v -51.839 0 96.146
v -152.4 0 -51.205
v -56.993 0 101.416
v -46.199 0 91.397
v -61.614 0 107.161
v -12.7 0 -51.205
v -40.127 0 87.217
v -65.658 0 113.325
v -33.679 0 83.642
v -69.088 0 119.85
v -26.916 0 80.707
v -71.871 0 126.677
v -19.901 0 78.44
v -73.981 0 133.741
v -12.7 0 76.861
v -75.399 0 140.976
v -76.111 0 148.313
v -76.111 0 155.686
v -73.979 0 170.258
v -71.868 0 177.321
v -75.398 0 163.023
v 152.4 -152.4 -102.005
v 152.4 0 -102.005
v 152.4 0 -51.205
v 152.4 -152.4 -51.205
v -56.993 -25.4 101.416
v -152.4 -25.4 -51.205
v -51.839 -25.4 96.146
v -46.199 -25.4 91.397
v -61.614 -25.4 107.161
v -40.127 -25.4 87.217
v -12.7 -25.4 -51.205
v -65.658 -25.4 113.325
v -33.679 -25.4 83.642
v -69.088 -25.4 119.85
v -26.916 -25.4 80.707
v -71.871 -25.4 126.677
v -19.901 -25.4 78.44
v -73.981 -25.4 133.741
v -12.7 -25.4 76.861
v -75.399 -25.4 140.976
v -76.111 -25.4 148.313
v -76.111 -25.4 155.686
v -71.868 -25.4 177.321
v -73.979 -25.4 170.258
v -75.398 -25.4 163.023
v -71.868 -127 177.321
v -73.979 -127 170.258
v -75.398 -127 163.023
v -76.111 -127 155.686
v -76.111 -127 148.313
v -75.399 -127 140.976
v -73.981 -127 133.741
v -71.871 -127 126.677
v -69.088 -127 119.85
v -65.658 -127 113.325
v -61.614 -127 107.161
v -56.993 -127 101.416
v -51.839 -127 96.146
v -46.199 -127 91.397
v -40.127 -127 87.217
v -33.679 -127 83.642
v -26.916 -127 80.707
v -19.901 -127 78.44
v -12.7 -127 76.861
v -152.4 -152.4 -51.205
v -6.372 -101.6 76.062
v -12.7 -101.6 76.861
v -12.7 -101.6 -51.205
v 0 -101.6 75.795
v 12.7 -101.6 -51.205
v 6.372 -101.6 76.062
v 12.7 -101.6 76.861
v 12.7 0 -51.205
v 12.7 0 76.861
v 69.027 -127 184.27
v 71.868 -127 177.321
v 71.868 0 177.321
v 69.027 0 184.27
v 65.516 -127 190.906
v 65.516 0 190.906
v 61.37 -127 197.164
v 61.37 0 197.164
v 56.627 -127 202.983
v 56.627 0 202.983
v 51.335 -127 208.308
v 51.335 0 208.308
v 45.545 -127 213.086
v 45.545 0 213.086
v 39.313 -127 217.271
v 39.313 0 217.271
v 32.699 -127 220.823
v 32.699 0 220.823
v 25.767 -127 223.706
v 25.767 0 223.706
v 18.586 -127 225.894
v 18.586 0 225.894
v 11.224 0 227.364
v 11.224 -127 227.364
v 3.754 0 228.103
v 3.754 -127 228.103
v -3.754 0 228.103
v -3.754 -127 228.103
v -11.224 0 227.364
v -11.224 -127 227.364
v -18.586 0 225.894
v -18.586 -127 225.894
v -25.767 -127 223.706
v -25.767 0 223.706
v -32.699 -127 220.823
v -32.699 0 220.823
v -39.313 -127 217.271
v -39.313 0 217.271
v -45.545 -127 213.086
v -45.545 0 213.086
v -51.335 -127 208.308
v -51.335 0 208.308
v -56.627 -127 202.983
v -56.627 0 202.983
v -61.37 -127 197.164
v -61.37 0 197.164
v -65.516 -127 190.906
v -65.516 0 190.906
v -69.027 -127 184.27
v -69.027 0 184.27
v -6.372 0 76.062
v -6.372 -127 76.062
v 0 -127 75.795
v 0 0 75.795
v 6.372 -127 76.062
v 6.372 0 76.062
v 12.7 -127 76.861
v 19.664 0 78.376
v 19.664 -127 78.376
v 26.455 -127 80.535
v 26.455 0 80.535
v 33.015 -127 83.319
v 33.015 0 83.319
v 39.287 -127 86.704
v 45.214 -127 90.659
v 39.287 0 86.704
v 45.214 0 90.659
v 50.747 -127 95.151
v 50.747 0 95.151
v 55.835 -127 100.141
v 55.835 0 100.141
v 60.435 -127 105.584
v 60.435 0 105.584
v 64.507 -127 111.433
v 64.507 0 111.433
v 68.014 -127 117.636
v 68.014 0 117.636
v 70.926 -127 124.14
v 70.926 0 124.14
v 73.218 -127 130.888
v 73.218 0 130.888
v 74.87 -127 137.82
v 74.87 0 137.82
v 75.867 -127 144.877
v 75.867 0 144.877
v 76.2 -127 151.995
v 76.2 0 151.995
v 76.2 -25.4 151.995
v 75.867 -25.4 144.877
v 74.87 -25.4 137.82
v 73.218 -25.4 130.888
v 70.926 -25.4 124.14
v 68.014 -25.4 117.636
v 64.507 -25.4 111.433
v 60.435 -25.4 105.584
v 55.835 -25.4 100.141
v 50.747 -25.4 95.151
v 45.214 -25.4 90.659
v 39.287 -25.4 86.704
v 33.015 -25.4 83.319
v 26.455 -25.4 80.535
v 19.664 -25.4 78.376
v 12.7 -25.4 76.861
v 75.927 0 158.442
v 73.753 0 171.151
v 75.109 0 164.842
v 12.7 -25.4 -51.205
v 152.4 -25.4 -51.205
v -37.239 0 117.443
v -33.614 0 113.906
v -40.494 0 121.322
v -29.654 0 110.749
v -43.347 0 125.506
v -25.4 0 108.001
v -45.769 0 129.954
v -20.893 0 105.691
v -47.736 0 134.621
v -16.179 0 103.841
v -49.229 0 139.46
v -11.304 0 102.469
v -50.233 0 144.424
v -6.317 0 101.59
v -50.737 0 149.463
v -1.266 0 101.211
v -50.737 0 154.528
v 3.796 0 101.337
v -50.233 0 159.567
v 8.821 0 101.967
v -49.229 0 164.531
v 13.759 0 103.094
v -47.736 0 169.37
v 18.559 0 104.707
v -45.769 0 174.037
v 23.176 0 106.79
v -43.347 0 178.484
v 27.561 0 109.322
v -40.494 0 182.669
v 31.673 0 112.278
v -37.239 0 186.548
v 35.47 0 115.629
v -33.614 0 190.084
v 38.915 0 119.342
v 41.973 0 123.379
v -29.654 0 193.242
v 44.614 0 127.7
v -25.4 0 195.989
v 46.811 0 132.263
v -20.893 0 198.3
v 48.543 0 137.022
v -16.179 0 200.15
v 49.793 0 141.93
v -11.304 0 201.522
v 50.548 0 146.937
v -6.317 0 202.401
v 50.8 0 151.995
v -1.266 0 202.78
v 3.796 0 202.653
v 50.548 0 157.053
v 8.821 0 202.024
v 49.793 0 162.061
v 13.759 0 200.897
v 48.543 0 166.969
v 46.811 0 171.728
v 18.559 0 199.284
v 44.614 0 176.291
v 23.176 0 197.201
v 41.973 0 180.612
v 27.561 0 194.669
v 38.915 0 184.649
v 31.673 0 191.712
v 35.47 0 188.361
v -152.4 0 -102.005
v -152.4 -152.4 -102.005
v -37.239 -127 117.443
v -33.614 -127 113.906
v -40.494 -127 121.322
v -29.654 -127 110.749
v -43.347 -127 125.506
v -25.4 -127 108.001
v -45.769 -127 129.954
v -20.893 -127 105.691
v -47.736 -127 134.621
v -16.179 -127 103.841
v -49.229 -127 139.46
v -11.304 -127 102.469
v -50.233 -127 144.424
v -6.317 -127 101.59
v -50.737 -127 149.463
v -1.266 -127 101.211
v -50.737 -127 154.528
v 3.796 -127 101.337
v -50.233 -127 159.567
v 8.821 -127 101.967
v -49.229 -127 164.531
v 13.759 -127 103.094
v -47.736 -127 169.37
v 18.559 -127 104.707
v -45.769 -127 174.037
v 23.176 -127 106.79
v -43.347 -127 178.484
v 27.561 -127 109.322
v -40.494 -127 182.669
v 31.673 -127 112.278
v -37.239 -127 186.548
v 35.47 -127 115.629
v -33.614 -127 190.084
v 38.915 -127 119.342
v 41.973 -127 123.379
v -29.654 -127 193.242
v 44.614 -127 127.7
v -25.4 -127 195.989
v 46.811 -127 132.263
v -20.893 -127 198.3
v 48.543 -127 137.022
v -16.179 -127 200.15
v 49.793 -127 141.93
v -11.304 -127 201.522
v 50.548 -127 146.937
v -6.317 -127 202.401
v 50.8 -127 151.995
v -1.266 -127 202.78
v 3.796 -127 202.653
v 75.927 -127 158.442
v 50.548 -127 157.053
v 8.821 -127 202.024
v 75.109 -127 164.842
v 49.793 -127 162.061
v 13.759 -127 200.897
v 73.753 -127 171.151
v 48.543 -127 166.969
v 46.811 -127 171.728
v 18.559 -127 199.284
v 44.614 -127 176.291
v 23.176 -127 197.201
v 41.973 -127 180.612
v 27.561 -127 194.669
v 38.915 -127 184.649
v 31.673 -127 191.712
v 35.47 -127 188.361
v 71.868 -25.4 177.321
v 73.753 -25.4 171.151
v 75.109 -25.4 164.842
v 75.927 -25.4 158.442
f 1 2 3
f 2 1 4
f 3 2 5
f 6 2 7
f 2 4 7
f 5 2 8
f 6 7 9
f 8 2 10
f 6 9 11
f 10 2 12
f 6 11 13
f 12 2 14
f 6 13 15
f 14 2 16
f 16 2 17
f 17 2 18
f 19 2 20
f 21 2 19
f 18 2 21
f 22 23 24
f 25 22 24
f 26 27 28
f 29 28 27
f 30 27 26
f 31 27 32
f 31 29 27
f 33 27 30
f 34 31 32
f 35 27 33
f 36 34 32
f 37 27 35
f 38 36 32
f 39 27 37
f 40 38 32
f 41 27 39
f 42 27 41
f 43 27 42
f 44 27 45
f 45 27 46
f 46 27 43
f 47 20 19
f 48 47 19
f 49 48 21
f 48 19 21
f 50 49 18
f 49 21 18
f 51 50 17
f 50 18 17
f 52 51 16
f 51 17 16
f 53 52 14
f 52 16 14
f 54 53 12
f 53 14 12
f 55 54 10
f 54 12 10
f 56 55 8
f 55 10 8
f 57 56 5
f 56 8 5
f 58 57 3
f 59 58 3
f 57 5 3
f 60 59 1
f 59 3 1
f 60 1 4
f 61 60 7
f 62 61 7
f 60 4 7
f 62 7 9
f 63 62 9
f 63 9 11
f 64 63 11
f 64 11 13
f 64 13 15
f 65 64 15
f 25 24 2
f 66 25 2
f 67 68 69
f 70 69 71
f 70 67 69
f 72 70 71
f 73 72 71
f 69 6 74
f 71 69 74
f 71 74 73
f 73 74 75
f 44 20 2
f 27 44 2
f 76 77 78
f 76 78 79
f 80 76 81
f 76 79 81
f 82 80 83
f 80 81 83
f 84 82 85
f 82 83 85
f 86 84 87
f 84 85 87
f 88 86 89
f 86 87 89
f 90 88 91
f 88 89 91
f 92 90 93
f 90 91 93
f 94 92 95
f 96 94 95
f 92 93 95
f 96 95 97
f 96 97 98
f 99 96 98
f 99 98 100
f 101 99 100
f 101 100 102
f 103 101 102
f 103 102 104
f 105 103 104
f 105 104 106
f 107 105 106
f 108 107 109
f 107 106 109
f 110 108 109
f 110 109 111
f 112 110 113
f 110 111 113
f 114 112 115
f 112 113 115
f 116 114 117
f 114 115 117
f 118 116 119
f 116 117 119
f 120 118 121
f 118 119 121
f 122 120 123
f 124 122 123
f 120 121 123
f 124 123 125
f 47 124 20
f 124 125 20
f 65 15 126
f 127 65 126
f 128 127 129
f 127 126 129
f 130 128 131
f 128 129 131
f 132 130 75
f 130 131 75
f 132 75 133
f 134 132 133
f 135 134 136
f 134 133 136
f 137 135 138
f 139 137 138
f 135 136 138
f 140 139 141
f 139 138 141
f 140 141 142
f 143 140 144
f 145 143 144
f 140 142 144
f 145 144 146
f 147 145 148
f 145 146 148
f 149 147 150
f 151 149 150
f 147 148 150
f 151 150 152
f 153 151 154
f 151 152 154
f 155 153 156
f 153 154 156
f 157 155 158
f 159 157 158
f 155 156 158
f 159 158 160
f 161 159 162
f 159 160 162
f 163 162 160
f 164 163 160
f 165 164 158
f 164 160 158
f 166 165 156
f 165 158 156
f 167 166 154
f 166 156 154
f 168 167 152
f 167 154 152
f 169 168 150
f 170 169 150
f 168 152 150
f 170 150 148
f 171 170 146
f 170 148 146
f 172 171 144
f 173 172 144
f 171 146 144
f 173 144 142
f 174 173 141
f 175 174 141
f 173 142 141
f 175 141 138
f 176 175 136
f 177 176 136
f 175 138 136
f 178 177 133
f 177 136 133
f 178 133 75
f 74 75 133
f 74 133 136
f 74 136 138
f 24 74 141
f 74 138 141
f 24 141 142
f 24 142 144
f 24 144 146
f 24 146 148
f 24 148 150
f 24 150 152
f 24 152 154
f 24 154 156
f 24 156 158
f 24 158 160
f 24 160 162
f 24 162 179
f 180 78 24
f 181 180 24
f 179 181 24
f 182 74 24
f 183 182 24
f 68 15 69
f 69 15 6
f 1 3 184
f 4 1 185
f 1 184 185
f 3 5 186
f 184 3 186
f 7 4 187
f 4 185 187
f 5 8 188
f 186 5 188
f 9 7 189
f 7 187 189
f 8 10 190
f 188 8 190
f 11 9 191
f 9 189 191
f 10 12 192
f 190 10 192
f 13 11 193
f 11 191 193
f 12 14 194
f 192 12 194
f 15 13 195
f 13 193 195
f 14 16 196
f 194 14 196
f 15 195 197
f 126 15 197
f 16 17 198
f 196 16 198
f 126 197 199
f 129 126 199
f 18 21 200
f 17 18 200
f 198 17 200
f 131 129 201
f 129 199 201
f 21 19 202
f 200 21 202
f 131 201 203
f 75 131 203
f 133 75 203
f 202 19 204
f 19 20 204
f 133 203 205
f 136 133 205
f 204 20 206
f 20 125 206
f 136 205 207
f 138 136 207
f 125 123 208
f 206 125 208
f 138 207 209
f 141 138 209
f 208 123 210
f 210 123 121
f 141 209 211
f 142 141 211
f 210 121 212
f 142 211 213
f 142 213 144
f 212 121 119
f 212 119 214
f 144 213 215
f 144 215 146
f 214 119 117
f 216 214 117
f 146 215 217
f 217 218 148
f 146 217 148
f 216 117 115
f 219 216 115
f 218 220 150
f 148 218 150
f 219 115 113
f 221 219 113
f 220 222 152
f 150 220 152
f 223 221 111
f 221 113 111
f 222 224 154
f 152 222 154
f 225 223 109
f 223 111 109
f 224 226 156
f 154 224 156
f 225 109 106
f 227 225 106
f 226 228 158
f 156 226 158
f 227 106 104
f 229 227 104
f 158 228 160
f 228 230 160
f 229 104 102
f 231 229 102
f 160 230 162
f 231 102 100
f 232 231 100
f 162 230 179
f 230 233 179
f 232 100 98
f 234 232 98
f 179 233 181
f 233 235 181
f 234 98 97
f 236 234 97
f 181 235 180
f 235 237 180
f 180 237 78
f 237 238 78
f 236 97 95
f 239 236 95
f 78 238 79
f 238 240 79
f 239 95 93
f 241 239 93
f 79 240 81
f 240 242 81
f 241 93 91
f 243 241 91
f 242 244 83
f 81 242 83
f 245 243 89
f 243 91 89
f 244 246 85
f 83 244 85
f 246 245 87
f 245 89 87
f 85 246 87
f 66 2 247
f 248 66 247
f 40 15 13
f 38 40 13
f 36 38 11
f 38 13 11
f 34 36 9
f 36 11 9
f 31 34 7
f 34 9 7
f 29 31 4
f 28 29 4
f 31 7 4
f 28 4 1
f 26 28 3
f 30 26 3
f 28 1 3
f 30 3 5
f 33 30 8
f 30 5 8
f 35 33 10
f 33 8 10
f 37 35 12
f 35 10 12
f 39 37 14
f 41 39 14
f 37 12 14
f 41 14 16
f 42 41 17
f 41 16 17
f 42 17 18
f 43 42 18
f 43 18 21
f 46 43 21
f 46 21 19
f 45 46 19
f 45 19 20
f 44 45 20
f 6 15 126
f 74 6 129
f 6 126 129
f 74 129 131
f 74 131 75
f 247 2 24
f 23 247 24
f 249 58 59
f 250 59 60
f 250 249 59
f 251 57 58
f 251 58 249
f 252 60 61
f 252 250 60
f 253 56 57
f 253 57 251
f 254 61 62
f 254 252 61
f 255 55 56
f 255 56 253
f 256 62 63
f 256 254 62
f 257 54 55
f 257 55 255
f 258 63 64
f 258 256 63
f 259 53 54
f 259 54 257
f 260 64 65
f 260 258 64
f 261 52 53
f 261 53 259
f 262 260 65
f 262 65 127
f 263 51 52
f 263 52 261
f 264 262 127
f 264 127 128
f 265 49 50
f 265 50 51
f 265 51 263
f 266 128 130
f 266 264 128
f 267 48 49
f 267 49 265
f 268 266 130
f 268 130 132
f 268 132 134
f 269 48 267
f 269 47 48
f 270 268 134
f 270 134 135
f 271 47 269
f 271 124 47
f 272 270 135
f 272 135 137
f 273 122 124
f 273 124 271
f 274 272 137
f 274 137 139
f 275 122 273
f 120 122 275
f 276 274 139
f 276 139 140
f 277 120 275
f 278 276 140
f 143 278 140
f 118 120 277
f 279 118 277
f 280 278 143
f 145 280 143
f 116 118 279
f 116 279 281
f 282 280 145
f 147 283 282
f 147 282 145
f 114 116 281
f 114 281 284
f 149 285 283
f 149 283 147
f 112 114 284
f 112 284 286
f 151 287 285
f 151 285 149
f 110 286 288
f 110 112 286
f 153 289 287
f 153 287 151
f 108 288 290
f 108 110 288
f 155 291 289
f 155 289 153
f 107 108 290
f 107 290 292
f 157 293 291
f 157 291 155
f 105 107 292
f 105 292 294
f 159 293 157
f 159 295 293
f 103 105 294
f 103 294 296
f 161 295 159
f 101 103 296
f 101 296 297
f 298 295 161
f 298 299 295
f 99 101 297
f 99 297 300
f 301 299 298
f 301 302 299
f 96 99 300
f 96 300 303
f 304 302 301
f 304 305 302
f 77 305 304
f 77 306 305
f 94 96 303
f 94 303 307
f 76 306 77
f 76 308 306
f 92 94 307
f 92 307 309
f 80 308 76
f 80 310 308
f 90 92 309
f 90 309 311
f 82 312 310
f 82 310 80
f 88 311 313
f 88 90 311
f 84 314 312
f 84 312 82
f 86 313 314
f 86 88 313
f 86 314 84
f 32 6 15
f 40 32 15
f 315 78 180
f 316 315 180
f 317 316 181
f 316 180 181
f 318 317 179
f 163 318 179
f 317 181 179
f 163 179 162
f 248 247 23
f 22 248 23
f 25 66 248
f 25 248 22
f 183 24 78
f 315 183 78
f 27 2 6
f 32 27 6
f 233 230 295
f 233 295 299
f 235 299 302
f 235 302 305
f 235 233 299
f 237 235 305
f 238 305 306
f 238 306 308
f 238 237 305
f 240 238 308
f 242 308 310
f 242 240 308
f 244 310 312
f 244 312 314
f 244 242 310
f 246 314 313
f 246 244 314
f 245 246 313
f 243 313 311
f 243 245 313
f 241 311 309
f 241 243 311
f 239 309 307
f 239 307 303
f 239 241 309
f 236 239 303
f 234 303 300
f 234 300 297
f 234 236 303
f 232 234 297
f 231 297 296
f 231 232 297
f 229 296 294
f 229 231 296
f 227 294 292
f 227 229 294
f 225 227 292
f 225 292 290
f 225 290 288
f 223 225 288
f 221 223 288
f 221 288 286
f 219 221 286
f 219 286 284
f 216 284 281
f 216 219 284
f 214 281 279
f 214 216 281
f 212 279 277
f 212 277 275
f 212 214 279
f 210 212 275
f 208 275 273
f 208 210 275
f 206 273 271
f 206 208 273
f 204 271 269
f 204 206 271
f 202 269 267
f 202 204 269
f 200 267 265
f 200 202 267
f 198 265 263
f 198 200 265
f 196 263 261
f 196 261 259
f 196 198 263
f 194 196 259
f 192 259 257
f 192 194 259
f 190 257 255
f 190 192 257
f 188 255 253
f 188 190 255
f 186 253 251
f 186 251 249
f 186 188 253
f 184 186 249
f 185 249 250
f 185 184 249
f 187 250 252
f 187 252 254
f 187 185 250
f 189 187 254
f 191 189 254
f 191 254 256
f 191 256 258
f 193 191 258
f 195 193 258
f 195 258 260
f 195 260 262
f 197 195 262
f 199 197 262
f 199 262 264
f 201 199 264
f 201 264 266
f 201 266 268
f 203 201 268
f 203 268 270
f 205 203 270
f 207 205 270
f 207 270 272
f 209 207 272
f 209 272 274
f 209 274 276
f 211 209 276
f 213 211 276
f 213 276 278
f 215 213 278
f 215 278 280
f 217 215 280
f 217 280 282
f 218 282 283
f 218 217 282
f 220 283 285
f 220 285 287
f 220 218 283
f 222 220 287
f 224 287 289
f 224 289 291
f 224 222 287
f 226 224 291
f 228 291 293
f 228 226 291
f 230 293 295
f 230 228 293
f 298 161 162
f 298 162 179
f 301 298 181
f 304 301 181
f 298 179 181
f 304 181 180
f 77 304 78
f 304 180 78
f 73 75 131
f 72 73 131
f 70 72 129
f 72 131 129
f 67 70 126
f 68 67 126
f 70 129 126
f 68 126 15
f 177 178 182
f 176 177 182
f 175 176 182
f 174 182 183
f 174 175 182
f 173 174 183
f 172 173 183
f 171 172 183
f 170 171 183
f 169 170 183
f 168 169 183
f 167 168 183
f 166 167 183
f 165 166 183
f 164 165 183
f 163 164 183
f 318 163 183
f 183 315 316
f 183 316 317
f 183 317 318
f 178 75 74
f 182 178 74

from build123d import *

# Parameters (mm, degrees)
F0_R     = 50.8
F1_DEPTH = 127
F2_DEPTH = 152.4
F3_DEPTH = 101.6
F4_DEPTH = 25.4


with BuildPart() as f1:
    # F0 (on Front) → F1 (new body)
    with BuildSketch(Plane.XZ):
        with BuildLine():
            ThreePointArc((71.868134, 177.321456), (0, 228.195356), (-71.868134, 177.321456))
            ThreePointArc((-71.868134, 177.321456), (-65.658289, 113.324578), (-12.7, 76.861143))
            ThreePointArc((-12.7, 76.861143), (0, 75.795356), (12.7, 76.861143))
            ThreePointArc((12.7, 76.861143), (58.198711, 102.808467), (76.2, 151.995356))
            ThreePointArc((76.2, 151.995356), (75.109226, 164.842305), (71.868134, 177.321456))
        make_face()
        with Locations((0, 151.995356)):
            Circle(F0_R, mode=Mode.SUBTRACT)
    extrude(amount=F1_DEPTH)


with BuildPart() as f2:
    # F0 (on Front) → F2 (new body)
    with BuildSketch(Plane.XZ):
        Polygon((-12.7, -51.204644), (-152.4, -51.204644), (-152.4, -102.004644), (152.4, -102.004644), (152.4, -51.204644), (12.7, -51.204644), align=None)
    extrude(amount=F2_DEPTH)


with BuildPart() as f3:
    # F0 (on Front) → F3 (new body)
    with BuildSketch(Plane.XZ):
        with BuildLine():
            Line((-12.7, 76.861143), (-12.7, -51.204644))
            Line((-12.7, -51.204644), (12.7, -51.204644))
            Line((12.7, -51.204644), (12.7, 76.861143))
            ThreePointArc((12.7, 76.861143), (0, 75.795356), (-12.7, 76.861143))
        make_face()
    extrude(amount=F3_DEPTH)


with BuildPart() as f4:
    # F0 (on Front) → F4 (new body)
    with BuildSketch(Plane.XZ):
        with BuildLine():
            Line((-71.868134, 177.321456), (-152.4, -51.204644))
            Line((-152.4, -51.204644), (-12.7, -51.204644))
            Line((-12.7, -51.204644), (-12.7, 76.861143))
            ThreePointArc((-12.7, 76.861143), (-65.658289, 113.324578), (-71.868134, 177.321456))
        make_face()
        with BuildLine():
            Line((12.7, 76.861143), (12.7, -51.204644))
            Line((12.7, -51.204644), (152.4, -51.204644))
            Line((152.4, -51.204644), (71.868134, 177.321456))
            ThreePointArc((71.868134, 177.321456), (75.109226, 164.842305), (76.2, 151.995356))
            ThreePointArc((76.2, 151.995356), (58.198711, 102.808467), (12.7, 76.861143))
        make_face()
    extrude(amount=F4_DEPTH)


solid = Compound([f1.part, f2.part, f3.part, f4.part])
